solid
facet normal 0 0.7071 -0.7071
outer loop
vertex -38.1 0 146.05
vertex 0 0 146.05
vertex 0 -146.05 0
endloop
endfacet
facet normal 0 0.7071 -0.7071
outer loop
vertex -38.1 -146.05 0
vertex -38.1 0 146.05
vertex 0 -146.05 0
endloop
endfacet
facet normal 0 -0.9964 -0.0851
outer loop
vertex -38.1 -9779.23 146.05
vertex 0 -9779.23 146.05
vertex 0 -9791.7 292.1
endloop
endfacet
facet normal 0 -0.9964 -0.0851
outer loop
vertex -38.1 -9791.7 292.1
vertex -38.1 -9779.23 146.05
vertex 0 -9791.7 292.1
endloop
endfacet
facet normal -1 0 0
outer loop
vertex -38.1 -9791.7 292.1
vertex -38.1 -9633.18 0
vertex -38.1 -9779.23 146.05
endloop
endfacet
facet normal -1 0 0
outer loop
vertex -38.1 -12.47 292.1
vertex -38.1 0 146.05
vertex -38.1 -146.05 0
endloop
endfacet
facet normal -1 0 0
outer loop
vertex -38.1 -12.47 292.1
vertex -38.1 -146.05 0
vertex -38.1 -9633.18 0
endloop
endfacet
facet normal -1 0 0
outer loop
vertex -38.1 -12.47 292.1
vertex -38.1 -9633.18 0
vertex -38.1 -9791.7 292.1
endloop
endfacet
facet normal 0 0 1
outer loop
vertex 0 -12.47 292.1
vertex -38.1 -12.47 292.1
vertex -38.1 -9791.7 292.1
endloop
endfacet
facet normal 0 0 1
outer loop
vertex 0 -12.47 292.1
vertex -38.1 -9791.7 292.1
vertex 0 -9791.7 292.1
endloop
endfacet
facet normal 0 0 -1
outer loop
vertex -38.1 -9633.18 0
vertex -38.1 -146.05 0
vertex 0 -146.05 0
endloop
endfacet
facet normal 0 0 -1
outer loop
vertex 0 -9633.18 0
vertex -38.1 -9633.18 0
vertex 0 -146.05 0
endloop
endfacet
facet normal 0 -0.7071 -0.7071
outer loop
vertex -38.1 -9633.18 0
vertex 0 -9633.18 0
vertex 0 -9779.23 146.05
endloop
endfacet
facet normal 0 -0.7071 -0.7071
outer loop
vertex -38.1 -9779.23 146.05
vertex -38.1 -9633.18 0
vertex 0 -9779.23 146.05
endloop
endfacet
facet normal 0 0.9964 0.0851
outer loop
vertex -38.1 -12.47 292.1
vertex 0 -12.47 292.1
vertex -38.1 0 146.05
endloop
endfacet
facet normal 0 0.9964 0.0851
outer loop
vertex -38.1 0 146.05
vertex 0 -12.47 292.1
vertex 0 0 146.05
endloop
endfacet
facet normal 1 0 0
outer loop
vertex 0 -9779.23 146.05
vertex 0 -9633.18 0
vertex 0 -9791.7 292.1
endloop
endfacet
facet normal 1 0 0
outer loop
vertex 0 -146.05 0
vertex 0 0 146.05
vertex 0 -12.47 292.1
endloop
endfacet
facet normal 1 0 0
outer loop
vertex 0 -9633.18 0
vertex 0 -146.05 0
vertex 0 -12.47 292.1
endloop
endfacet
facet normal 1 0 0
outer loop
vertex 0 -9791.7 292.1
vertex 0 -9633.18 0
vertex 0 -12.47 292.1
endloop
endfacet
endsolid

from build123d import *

# Parameters (mm, degrees)
F0_W     = 38.1
F0_H     = 292.1
F1_DEPTH = 9791.7
F3_DEPTH = 38.101
F5_DEPTH = 38.101


with BuildPart() as f1:
    # F0 (on Front) → F1 (new body)
    with BuildSketch(Plane.XZ):
        with Locations((-19.05, 146.05)):
            Rectangle(F0_W, F0_H)
    extrude(amount=F1_DEPTH)

    # F2 (on face) → F3 (cut, through all)
    with BuildSketch(Plane.YZ):
        Polygon((-9779.230452, 146.05), (-9791.7, 292.1), (-9791.7, 0), (-9633.180452, 0), align=None)
    extrude(amount=-F3_DEPTH, mode=Mode.SUBTRACT)

    # F4 (on face) → F5 (cut, through all)
    with BuildSketch(Plane.YZ):
        Polygon((-146.05, 0), (0, 0), (0, 146.05), align=None)
        Polygon((-12.469548, 292.1), (0, 146.05), (0, 292.1), align=None)
    extrude(amount=-F5_DEPTH, mode=Mode.SUBTRACT)


solid = f1.part
